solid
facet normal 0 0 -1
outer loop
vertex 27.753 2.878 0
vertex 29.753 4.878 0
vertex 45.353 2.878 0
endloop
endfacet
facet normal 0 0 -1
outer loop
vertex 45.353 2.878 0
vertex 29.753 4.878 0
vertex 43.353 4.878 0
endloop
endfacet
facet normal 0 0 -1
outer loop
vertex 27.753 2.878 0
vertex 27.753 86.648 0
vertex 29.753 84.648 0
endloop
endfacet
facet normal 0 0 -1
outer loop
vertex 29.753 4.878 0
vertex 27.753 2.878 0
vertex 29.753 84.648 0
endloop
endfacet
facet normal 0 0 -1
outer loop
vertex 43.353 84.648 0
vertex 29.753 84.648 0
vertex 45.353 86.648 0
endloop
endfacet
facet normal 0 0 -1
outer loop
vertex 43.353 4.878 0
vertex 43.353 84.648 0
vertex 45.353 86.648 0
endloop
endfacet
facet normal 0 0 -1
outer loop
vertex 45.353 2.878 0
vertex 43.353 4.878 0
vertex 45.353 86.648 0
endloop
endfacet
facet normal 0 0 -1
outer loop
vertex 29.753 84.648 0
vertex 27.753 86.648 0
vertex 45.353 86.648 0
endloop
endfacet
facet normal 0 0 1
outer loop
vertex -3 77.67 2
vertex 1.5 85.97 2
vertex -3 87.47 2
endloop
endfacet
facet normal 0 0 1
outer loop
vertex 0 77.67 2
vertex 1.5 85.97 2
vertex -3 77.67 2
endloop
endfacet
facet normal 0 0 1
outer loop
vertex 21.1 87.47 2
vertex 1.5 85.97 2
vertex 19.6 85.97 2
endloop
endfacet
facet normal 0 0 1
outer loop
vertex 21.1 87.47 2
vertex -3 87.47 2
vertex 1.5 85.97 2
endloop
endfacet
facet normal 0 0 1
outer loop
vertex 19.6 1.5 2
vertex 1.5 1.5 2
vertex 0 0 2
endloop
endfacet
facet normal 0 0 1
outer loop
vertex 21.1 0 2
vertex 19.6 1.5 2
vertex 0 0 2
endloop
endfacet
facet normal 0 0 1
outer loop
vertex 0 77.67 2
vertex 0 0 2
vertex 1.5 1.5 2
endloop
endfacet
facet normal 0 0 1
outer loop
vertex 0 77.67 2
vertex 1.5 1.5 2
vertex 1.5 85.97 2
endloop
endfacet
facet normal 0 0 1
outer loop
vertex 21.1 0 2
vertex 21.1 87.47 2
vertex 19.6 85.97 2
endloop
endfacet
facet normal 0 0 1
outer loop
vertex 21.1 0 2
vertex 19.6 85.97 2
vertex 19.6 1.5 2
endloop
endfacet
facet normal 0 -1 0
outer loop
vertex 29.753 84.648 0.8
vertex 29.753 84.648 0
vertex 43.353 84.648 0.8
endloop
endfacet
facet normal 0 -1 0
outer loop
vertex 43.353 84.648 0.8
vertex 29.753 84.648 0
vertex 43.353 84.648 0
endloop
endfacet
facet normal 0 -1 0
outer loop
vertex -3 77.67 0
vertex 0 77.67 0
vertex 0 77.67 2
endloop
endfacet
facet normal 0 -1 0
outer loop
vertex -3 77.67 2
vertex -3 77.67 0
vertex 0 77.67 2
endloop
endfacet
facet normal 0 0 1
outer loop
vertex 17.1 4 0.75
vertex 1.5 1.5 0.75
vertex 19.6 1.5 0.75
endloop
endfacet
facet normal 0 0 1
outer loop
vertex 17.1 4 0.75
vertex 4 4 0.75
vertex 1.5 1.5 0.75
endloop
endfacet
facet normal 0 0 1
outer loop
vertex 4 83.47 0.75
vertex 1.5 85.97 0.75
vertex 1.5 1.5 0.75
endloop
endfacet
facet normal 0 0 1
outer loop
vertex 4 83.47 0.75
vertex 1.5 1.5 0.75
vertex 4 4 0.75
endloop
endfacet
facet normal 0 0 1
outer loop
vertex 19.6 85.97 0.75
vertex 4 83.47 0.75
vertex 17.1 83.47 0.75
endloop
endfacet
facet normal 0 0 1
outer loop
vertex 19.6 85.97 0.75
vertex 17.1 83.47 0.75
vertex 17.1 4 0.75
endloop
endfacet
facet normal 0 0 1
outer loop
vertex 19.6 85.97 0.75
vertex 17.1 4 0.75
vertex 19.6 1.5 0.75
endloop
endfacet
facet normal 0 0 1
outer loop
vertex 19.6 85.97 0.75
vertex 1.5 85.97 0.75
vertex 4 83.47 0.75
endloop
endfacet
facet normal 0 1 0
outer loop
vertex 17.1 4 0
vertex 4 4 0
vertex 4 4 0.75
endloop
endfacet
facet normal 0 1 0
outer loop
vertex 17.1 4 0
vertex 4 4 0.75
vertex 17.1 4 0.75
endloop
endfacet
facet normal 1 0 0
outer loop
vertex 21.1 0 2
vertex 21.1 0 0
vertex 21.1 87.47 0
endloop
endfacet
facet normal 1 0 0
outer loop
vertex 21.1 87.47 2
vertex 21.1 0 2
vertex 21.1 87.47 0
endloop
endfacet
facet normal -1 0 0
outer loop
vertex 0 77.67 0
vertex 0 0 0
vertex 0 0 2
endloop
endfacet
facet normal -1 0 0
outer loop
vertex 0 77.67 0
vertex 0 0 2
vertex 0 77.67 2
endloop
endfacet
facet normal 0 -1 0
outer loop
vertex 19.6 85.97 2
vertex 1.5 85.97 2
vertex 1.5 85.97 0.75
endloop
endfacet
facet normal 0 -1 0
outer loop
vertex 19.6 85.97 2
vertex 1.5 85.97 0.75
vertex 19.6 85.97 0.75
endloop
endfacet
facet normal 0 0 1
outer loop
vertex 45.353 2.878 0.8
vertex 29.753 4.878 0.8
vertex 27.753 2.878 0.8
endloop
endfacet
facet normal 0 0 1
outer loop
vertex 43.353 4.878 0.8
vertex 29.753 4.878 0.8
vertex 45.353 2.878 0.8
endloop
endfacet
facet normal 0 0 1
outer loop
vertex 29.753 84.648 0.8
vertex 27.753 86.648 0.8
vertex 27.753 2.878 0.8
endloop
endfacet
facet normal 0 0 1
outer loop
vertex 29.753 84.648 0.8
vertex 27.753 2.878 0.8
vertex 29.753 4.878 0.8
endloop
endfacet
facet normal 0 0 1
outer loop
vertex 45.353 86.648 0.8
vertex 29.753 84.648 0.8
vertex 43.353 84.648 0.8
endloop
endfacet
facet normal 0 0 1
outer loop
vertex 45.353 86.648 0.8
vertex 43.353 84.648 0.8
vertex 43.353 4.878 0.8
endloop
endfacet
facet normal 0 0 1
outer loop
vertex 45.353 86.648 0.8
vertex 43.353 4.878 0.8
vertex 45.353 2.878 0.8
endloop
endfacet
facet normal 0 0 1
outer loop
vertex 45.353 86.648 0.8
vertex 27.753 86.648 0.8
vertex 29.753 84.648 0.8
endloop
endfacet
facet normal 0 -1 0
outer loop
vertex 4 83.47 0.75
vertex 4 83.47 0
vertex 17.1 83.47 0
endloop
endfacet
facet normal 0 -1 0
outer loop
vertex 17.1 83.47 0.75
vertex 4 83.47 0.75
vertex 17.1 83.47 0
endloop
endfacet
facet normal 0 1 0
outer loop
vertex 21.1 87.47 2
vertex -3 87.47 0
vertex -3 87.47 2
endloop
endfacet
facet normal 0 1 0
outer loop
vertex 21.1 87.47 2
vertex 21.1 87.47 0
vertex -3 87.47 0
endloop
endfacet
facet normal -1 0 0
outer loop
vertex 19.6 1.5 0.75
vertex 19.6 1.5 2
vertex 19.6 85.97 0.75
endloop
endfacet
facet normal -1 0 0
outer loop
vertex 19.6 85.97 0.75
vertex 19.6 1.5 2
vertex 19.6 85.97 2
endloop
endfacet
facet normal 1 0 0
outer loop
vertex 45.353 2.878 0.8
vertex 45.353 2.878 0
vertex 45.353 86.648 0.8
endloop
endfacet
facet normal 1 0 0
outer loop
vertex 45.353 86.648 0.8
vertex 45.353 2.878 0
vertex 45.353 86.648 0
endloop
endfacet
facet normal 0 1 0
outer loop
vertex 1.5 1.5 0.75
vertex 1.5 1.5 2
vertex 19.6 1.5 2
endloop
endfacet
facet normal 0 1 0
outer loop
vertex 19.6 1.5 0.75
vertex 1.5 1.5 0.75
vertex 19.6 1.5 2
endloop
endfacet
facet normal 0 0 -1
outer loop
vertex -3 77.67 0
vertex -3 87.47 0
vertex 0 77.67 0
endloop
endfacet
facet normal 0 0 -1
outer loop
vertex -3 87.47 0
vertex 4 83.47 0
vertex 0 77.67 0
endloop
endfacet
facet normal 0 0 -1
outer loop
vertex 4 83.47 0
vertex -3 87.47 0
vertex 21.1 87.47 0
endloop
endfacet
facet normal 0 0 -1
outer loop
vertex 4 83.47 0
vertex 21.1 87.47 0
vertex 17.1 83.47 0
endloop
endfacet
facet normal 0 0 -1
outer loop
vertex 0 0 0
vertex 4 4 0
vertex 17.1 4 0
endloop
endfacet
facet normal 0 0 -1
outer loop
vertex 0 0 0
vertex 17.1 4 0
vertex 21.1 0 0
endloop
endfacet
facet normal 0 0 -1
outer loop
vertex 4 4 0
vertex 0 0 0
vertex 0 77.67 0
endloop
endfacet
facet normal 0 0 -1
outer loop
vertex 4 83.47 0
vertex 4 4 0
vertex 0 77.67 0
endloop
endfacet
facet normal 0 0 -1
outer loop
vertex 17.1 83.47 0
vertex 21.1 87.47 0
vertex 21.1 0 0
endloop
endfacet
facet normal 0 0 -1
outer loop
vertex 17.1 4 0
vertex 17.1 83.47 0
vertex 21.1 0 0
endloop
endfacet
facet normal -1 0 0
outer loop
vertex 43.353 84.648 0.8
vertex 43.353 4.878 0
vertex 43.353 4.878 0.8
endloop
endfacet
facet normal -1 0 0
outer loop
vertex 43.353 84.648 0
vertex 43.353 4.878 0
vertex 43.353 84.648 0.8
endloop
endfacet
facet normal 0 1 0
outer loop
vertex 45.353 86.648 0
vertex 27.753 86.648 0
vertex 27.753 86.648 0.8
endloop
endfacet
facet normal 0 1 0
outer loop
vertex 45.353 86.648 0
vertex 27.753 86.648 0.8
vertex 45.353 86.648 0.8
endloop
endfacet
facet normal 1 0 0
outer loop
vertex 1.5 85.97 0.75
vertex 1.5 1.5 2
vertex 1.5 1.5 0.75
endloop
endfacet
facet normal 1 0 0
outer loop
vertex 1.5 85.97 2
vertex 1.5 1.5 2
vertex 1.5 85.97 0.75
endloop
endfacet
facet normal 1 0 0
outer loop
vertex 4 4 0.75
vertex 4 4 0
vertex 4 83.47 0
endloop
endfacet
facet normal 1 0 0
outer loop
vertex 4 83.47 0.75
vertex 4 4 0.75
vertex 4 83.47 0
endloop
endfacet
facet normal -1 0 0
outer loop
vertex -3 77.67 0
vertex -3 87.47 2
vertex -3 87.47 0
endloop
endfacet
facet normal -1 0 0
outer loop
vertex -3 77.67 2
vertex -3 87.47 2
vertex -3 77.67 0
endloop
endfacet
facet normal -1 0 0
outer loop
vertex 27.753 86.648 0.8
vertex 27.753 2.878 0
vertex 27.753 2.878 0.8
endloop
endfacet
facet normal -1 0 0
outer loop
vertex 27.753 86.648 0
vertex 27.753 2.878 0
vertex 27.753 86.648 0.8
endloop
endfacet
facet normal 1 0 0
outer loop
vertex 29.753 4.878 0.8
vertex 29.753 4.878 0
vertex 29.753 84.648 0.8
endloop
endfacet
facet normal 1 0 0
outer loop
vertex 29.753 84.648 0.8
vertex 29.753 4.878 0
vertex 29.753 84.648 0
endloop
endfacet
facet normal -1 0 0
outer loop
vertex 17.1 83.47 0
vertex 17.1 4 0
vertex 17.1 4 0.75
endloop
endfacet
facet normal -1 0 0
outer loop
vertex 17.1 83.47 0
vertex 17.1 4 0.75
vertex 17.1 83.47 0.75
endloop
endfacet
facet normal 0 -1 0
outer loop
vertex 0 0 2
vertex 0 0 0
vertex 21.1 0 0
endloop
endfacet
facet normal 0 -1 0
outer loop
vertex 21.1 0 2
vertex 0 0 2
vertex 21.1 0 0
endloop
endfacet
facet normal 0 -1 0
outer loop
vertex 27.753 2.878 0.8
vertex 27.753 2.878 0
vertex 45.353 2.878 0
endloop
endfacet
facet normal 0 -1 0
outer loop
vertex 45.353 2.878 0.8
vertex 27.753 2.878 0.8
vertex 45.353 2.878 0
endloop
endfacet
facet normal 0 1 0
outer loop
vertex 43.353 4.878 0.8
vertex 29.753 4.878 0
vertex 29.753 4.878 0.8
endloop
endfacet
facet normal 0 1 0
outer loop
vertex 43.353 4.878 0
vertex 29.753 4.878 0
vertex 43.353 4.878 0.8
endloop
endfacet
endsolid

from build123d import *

# Parameters (mm, degrees)
F0_W     = 21.1
F0_H     = 87.47
F0_W_2   = 13.1
F0_H_2   = 79.47
F1_DEPTH = 2
F2_W     = 18.1
F2_H     = 84.47
F3_DEPTH = 1.25
F4_W     = 17.6
F4_H     = 83.77
F4_W_2   = 13.6
F4_H_2   = 79.77
F5_DEPTH = 0.8
F6_W     = 9.8
F6_H     = 2
F7_DEPTH = 3


with BuildPart() as f1:
    # F0 (on Top) → F1 (new body)
    with BuildSketch(Plane.XY):
        with Locations((10.55, 43.735)):
            Rectangle(F0_W, F0_H)
        with Locations((10.55, 43.735)):
            Rectangle(F0_W_2, F0_H_2, mode=Mode.SUBTRACT)
    extrude(amount=F1_DEPTH)

    # F2 (on face) → F3 (cut)
    with BuildSketch(Plane.XY.offset(2)):
        with Locations((10.55, 43.735)):
            Rectangle(F2_W, F2_H)
    extrude(amount=-F3_DEPTH, mode=Mode.SUBTRACT)

    # F6 (on face) → F7 (join)
    with BuildSketch(Plane(origin=(0, 0, 0), x_dir=(0, -1, 0), z_dir=(-1, 0, 0))):
        with Locations((-82.57, 1)):
            Rectangle(F6_W, F6_H)
    extrude(amount=F7_DEPTH)


with BuildPart() as f5:
    # F4 (on Top) → F5 (new body)
    with BuildSketch(Plane.XY):
        with Locations((36.552641, 44.763047)):
            Rectangle(F4_W, F4_H)
        with Locations((36.552641, 44.763047)):
            Rectangle(F4_W_2, F4_H_2, mode=Mode.SUBTRACT)
    extrude(amount=F5_DEPTH)


solid = Compound([f1.part, f5.part])
